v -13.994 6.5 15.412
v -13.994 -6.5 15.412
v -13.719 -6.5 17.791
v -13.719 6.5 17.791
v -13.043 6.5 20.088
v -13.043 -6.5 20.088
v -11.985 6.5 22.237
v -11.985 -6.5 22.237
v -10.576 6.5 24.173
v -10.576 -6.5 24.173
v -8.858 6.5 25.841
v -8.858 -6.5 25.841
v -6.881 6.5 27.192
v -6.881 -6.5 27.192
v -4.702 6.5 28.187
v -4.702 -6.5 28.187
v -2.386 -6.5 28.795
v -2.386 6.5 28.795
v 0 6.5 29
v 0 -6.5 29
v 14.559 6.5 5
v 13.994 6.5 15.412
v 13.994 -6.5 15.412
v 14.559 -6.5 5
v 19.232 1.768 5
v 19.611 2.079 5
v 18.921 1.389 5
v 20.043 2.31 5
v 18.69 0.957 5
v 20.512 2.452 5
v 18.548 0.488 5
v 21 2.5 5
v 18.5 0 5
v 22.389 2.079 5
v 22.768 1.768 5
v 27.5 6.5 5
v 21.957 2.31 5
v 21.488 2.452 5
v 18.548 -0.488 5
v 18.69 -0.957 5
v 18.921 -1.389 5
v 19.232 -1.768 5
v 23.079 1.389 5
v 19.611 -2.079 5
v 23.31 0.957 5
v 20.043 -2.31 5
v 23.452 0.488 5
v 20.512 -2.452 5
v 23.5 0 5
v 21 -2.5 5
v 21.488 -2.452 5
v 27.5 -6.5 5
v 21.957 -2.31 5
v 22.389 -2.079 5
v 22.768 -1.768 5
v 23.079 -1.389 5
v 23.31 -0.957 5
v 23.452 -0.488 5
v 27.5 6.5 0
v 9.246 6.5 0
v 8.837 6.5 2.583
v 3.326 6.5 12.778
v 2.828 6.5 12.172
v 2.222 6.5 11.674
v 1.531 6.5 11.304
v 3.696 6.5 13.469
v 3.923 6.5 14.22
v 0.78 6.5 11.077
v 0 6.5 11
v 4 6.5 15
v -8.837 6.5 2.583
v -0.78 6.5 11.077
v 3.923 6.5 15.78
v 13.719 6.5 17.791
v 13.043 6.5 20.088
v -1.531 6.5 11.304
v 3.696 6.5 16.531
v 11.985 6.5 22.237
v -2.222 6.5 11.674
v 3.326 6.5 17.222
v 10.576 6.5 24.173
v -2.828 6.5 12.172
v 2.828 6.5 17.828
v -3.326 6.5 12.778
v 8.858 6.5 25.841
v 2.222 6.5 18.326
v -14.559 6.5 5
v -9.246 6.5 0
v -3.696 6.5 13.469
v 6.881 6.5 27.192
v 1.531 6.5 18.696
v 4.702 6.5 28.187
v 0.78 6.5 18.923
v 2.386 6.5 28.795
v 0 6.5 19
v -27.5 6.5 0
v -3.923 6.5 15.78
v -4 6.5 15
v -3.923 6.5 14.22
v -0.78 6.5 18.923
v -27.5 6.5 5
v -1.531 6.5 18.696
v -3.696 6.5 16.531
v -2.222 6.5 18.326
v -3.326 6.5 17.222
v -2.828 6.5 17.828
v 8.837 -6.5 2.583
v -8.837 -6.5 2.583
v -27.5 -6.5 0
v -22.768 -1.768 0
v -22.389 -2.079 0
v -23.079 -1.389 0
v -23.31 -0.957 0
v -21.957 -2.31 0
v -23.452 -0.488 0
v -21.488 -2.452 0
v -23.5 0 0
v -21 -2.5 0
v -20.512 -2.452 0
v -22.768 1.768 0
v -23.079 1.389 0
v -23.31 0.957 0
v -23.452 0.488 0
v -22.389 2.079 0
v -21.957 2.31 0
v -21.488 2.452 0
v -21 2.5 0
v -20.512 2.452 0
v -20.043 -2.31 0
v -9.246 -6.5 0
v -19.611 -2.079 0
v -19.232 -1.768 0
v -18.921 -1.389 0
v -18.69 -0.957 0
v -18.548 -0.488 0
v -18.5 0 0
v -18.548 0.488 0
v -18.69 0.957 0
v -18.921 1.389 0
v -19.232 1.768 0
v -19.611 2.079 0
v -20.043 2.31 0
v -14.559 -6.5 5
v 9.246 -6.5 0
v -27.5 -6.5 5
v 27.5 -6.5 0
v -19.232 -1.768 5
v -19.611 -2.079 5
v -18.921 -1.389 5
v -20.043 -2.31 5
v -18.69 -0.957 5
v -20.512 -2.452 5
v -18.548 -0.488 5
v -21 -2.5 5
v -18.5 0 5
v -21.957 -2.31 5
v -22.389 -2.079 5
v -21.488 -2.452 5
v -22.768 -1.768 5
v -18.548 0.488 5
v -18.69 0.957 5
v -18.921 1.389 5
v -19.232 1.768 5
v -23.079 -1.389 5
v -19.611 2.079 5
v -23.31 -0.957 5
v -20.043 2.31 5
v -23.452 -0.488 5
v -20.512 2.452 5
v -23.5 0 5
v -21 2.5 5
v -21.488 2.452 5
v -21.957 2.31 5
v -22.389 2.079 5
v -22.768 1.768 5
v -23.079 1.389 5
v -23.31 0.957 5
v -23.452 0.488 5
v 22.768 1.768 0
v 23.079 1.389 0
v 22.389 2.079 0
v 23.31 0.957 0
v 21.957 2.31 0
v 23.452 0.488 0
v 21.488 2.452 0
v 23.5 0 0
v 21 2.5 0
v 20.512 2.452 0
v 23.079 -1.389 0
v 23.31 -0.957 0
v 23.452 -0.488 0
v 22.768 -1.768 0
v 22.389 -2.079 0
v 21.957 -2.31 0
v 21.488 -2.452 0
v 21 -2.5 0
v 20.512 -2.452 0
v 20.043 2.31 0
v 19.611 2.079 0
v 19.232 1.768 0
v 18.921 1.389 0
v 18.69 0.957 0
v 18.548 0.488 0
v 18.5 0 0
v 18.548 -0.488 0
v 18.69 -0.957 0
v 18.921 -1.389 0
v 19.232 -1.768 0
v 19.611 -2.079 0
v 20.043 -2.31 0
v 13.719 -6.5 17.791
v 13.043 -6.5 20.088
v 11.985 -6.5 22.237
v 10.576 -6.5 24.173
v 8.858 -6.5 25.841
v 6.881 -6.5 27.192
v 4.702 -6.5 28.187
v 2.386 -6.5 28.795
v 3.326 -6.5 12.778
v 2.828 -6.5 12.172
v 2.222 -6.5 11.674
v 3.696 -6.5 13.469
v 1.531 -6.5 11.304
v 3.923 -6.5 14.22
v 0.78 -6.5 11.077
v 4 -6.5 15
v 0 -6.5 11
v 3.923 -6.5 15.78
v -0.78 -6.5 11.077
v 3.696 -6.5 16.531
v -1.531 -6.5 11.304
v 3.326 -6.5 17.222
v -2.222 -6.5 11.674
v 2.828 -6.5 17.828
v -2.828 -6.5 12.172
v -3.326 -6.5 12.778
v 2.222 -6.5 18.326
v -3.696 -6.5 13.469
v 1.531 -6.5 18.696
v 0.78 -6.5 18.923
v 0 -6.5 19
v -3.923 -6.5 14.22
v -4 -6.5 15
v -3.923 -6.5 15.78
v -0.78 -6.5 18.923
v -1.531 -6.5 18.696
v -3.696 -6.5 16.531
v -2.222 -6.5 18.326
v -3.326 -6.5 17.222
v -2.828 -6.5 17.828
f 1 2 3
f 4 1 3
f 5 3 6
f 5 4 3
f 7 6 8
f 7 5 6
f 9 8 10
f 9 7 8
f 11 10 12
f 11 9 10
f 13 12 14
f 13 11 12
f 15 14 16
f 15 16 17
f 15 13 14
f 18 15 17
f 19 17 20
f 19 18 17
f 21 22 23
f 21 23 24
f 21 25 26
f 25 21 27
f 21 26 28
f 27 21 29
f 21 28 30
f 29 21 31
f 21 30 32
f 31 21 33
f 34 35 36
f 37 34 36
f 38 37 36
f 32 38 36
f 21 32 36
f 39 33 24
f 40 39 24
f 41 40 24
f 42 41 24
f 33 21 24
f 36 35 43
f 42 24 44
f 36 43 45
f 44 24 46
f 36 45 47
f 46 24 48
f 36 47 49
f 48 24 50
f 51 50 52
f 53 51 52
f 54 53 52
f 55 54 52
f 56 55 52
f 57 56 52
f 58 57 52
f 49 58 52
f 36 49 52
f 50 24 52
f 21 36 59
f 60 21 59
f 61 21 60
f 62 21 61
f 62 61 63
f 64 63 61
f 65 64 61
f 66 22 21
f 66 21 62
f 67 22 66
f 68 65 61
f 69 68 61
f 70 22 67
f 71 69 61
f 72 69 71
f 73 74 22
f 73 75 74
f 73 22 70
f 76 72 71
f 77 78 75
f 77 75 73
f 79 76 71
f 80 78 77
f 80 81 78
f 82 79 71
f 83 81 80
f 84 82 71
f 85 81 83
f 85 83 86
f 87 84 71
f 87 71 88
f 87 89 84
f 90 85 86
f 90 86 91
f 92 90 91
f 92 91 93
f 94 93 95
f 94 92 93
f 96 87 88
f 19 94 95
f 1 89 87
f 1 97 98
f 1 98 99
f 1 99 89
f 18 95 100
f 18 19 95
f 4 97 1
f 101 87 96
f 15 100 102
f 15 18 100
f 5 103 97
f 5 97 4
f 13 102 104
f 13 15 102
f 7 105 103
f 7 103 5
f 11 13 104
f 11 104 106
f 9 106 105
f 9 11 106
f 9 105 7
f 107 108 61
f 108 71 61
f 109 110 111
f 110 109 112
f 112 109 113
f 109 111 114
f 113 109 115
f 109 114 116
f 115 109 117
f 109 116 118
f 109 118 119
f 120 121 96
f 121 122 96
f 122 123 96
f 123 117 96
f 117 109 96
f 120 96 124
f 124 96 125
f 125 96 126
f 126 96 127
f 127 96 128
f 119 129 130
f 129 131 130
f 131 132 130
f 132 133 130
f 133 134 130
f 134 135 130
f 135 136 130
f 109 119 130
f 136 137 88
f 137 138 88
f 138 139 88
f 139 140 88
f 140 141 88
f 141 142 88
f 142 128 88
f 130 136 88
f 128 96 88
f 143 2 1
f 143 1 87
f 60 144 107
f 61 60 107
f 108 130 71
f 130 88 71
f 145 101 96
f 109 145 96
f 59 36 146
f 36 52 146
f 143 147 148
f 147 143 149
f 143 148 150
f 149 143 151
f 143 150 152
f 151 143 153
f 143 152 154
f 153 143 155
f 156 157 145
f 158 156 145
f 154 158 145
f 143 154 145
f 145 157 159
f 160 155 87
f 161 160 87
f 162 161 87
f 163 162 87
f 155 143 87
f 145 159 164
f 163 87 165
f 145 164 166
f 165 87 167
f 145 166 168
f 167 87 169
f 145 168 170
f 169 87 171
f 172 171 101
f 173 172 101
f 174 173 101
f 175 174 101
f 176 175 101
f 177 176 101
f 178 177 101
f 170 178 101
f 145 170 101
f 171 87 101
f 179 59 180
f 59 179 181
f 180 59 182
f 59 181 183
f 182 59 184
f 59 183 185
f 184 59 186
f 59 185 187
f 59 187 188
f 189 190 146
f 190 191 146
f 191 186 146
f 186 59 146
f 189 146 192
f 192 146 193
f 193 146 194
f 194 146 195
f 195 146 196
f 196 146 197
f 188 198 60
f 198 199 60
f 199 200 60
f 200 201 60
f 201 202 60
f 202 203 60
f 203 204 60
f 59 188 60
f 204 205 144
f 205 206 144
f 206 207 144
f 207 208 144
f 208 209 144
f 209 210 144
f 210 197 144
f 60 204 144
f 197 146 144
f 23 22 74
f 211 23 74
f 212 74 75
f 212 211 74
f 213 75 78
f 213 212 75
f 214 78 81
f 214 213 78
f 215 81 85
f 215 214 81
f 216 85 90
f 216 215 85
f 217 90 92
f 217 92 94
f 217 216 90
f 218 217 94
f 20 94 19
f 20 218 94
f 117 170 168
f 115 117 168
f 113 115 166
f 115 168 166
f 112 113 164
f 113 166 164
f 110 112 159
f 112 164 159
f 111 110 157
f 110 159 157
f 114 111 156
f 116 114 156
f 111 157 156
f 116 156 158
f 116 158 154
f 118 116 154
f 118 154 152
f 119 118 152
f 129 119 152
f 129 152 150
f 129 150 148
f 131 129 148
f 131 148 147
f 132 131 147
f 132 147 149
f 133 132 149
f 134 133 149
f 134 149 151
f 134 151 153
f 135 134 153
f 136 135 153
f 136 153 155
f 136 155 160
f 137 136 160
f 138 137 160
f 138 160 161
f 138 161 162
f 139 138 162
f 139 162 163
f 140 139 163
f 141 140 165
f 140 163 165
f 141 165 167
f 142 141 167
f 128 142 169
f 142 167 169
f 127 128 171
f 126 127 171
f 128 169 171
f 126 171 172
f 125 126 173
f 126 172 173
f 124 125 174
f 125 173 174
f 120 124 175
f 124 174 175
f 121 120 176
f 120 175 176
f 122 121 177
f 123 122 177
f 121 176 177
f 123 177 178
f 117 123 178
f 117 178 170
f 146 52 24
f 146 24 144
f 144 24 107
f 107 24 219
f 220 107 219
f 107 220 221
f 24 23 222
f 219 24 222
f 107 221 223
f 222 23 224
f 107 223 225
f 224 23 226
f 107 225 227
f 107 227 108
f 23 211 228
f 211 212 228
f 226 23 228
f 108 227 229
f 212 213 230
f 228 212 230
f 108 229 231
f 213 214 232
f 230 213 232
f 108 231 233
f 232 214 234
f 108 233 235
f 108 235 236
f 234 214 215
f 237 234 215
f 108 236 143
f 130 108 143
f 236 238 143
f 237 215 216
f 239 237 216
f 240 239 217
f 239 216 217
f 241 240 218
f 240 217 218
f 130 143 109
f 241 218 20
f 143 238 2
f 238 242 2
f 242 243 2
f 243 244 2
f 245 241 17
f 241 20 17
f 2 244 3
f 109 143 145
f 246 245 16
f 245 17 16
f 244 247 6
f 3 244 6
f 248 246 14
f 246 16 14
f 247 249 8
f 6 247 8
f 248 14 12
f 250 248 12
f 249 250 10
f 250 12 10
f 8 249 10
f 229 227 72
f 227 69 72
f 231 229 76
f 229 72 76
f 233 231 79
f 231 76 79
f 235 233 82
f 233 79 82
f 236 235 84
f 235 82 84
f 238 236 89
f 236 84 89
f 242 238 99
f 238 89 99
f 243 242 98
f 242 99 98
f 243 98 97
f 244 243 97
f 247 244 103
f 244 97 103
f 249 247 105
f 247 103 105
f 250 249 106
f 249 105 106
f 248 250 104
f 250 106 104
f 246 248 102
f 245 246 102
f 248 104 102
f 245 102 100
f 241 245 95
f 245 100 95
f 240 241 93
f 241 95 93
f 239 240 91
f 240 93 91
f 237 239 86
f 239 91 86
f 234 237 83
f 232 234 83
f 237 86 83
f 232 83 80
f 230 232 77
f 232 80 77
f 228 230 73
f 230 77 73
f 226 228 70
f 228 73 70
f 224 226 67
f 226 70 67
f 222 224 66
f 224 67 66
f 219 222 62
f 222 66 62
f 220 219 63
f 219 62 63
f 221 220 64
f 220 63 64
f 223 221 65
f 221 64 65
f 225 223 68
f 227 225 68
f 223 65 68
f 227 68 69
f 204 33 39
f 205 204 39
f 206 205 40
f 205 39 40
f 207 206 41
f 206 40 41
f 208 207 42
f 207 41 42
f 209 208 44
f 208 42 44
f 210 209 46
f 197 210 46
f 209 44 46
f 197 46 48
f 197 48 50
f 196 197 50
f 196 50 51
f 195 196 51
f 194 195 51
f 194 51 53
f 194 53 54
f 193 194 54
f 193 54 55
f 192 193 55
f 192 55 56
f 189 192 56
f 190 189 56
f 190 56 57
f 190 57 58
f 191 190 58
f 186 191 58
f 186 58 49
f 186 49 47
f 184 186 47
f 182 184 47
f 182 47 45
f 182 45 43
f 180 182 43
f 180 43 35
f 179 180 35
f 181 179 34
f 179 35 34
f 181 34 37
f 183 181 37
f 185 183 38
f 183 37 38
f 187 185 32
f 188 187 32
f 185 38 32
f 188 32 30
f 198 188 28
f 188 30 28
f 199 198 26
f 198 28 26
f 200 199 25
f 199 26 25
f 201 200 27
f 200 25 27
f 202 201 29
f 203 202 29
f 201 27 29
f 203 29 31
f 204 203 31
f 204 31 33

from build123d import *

# Parameters (mm, degrees)
PAD309_DEPTH      = 6.5
PAD309_DEPTH_BACK = 6.5
SKETCH722_R       = 2.5
POCKET253_DEPTH   = 100


with BuildPart() as part:
    # Sketch721 → Pad309 (new body, two sides)
    with BuildSketch(Plane.XZ) as pad309_sk:
        with BuildLine():
            ThreePointArc((13.993934, 15.412077), (9.752716, 25.04413), (0, 29))
            Line((0, 29), (0, 19))
            ThreePointArc((0, 11), (4, 15), (0, 19))
            Line((0, 11), (0, 2.582699))
            Line((8.836548, 2.582699), (0, 2.582699))
            Line((9.246055, 0), (8.836548, 2.582699))
            Line((27.5, 0), (9.246055, 0))
            Line((27.5, 5), (27.5, 0))
            Line((14.559493, 5), (27.5, 5))
            Line((13.993934, 15.412077), (14.559493, 5))
        make_face()
    pad309 = extrude(amount=PAD309_DEPTH) + extrude(pad309_sk.sketch, amount=-PAD309_DEPTH_BACK)

    # Mirrored001: Pad309 across Sketch721 V_Axis
    add(pad309.mirror(Plane(origin=(0, 0, 0), x_dir=(0, -1, 0), z_dir=(1, 0, 0))))

    # Sketch722 (on Face4 of Mirrored001) → Pocket253 (cut)
    with BuildSketch(Plane(origin=(0, 0, 5), x_dir=(-1, 0, 0), z_dir=(0, 0, 1))):
        with Locations((21, 0)):
            Circle(SKETCH722_R)
        with Locations((-21, 0)):
            Circle(SKETCH722_R)
    extrude(amount=-POCKET253_DEPTH, mode=Mode.SUBTRACT)


solid = part.part
